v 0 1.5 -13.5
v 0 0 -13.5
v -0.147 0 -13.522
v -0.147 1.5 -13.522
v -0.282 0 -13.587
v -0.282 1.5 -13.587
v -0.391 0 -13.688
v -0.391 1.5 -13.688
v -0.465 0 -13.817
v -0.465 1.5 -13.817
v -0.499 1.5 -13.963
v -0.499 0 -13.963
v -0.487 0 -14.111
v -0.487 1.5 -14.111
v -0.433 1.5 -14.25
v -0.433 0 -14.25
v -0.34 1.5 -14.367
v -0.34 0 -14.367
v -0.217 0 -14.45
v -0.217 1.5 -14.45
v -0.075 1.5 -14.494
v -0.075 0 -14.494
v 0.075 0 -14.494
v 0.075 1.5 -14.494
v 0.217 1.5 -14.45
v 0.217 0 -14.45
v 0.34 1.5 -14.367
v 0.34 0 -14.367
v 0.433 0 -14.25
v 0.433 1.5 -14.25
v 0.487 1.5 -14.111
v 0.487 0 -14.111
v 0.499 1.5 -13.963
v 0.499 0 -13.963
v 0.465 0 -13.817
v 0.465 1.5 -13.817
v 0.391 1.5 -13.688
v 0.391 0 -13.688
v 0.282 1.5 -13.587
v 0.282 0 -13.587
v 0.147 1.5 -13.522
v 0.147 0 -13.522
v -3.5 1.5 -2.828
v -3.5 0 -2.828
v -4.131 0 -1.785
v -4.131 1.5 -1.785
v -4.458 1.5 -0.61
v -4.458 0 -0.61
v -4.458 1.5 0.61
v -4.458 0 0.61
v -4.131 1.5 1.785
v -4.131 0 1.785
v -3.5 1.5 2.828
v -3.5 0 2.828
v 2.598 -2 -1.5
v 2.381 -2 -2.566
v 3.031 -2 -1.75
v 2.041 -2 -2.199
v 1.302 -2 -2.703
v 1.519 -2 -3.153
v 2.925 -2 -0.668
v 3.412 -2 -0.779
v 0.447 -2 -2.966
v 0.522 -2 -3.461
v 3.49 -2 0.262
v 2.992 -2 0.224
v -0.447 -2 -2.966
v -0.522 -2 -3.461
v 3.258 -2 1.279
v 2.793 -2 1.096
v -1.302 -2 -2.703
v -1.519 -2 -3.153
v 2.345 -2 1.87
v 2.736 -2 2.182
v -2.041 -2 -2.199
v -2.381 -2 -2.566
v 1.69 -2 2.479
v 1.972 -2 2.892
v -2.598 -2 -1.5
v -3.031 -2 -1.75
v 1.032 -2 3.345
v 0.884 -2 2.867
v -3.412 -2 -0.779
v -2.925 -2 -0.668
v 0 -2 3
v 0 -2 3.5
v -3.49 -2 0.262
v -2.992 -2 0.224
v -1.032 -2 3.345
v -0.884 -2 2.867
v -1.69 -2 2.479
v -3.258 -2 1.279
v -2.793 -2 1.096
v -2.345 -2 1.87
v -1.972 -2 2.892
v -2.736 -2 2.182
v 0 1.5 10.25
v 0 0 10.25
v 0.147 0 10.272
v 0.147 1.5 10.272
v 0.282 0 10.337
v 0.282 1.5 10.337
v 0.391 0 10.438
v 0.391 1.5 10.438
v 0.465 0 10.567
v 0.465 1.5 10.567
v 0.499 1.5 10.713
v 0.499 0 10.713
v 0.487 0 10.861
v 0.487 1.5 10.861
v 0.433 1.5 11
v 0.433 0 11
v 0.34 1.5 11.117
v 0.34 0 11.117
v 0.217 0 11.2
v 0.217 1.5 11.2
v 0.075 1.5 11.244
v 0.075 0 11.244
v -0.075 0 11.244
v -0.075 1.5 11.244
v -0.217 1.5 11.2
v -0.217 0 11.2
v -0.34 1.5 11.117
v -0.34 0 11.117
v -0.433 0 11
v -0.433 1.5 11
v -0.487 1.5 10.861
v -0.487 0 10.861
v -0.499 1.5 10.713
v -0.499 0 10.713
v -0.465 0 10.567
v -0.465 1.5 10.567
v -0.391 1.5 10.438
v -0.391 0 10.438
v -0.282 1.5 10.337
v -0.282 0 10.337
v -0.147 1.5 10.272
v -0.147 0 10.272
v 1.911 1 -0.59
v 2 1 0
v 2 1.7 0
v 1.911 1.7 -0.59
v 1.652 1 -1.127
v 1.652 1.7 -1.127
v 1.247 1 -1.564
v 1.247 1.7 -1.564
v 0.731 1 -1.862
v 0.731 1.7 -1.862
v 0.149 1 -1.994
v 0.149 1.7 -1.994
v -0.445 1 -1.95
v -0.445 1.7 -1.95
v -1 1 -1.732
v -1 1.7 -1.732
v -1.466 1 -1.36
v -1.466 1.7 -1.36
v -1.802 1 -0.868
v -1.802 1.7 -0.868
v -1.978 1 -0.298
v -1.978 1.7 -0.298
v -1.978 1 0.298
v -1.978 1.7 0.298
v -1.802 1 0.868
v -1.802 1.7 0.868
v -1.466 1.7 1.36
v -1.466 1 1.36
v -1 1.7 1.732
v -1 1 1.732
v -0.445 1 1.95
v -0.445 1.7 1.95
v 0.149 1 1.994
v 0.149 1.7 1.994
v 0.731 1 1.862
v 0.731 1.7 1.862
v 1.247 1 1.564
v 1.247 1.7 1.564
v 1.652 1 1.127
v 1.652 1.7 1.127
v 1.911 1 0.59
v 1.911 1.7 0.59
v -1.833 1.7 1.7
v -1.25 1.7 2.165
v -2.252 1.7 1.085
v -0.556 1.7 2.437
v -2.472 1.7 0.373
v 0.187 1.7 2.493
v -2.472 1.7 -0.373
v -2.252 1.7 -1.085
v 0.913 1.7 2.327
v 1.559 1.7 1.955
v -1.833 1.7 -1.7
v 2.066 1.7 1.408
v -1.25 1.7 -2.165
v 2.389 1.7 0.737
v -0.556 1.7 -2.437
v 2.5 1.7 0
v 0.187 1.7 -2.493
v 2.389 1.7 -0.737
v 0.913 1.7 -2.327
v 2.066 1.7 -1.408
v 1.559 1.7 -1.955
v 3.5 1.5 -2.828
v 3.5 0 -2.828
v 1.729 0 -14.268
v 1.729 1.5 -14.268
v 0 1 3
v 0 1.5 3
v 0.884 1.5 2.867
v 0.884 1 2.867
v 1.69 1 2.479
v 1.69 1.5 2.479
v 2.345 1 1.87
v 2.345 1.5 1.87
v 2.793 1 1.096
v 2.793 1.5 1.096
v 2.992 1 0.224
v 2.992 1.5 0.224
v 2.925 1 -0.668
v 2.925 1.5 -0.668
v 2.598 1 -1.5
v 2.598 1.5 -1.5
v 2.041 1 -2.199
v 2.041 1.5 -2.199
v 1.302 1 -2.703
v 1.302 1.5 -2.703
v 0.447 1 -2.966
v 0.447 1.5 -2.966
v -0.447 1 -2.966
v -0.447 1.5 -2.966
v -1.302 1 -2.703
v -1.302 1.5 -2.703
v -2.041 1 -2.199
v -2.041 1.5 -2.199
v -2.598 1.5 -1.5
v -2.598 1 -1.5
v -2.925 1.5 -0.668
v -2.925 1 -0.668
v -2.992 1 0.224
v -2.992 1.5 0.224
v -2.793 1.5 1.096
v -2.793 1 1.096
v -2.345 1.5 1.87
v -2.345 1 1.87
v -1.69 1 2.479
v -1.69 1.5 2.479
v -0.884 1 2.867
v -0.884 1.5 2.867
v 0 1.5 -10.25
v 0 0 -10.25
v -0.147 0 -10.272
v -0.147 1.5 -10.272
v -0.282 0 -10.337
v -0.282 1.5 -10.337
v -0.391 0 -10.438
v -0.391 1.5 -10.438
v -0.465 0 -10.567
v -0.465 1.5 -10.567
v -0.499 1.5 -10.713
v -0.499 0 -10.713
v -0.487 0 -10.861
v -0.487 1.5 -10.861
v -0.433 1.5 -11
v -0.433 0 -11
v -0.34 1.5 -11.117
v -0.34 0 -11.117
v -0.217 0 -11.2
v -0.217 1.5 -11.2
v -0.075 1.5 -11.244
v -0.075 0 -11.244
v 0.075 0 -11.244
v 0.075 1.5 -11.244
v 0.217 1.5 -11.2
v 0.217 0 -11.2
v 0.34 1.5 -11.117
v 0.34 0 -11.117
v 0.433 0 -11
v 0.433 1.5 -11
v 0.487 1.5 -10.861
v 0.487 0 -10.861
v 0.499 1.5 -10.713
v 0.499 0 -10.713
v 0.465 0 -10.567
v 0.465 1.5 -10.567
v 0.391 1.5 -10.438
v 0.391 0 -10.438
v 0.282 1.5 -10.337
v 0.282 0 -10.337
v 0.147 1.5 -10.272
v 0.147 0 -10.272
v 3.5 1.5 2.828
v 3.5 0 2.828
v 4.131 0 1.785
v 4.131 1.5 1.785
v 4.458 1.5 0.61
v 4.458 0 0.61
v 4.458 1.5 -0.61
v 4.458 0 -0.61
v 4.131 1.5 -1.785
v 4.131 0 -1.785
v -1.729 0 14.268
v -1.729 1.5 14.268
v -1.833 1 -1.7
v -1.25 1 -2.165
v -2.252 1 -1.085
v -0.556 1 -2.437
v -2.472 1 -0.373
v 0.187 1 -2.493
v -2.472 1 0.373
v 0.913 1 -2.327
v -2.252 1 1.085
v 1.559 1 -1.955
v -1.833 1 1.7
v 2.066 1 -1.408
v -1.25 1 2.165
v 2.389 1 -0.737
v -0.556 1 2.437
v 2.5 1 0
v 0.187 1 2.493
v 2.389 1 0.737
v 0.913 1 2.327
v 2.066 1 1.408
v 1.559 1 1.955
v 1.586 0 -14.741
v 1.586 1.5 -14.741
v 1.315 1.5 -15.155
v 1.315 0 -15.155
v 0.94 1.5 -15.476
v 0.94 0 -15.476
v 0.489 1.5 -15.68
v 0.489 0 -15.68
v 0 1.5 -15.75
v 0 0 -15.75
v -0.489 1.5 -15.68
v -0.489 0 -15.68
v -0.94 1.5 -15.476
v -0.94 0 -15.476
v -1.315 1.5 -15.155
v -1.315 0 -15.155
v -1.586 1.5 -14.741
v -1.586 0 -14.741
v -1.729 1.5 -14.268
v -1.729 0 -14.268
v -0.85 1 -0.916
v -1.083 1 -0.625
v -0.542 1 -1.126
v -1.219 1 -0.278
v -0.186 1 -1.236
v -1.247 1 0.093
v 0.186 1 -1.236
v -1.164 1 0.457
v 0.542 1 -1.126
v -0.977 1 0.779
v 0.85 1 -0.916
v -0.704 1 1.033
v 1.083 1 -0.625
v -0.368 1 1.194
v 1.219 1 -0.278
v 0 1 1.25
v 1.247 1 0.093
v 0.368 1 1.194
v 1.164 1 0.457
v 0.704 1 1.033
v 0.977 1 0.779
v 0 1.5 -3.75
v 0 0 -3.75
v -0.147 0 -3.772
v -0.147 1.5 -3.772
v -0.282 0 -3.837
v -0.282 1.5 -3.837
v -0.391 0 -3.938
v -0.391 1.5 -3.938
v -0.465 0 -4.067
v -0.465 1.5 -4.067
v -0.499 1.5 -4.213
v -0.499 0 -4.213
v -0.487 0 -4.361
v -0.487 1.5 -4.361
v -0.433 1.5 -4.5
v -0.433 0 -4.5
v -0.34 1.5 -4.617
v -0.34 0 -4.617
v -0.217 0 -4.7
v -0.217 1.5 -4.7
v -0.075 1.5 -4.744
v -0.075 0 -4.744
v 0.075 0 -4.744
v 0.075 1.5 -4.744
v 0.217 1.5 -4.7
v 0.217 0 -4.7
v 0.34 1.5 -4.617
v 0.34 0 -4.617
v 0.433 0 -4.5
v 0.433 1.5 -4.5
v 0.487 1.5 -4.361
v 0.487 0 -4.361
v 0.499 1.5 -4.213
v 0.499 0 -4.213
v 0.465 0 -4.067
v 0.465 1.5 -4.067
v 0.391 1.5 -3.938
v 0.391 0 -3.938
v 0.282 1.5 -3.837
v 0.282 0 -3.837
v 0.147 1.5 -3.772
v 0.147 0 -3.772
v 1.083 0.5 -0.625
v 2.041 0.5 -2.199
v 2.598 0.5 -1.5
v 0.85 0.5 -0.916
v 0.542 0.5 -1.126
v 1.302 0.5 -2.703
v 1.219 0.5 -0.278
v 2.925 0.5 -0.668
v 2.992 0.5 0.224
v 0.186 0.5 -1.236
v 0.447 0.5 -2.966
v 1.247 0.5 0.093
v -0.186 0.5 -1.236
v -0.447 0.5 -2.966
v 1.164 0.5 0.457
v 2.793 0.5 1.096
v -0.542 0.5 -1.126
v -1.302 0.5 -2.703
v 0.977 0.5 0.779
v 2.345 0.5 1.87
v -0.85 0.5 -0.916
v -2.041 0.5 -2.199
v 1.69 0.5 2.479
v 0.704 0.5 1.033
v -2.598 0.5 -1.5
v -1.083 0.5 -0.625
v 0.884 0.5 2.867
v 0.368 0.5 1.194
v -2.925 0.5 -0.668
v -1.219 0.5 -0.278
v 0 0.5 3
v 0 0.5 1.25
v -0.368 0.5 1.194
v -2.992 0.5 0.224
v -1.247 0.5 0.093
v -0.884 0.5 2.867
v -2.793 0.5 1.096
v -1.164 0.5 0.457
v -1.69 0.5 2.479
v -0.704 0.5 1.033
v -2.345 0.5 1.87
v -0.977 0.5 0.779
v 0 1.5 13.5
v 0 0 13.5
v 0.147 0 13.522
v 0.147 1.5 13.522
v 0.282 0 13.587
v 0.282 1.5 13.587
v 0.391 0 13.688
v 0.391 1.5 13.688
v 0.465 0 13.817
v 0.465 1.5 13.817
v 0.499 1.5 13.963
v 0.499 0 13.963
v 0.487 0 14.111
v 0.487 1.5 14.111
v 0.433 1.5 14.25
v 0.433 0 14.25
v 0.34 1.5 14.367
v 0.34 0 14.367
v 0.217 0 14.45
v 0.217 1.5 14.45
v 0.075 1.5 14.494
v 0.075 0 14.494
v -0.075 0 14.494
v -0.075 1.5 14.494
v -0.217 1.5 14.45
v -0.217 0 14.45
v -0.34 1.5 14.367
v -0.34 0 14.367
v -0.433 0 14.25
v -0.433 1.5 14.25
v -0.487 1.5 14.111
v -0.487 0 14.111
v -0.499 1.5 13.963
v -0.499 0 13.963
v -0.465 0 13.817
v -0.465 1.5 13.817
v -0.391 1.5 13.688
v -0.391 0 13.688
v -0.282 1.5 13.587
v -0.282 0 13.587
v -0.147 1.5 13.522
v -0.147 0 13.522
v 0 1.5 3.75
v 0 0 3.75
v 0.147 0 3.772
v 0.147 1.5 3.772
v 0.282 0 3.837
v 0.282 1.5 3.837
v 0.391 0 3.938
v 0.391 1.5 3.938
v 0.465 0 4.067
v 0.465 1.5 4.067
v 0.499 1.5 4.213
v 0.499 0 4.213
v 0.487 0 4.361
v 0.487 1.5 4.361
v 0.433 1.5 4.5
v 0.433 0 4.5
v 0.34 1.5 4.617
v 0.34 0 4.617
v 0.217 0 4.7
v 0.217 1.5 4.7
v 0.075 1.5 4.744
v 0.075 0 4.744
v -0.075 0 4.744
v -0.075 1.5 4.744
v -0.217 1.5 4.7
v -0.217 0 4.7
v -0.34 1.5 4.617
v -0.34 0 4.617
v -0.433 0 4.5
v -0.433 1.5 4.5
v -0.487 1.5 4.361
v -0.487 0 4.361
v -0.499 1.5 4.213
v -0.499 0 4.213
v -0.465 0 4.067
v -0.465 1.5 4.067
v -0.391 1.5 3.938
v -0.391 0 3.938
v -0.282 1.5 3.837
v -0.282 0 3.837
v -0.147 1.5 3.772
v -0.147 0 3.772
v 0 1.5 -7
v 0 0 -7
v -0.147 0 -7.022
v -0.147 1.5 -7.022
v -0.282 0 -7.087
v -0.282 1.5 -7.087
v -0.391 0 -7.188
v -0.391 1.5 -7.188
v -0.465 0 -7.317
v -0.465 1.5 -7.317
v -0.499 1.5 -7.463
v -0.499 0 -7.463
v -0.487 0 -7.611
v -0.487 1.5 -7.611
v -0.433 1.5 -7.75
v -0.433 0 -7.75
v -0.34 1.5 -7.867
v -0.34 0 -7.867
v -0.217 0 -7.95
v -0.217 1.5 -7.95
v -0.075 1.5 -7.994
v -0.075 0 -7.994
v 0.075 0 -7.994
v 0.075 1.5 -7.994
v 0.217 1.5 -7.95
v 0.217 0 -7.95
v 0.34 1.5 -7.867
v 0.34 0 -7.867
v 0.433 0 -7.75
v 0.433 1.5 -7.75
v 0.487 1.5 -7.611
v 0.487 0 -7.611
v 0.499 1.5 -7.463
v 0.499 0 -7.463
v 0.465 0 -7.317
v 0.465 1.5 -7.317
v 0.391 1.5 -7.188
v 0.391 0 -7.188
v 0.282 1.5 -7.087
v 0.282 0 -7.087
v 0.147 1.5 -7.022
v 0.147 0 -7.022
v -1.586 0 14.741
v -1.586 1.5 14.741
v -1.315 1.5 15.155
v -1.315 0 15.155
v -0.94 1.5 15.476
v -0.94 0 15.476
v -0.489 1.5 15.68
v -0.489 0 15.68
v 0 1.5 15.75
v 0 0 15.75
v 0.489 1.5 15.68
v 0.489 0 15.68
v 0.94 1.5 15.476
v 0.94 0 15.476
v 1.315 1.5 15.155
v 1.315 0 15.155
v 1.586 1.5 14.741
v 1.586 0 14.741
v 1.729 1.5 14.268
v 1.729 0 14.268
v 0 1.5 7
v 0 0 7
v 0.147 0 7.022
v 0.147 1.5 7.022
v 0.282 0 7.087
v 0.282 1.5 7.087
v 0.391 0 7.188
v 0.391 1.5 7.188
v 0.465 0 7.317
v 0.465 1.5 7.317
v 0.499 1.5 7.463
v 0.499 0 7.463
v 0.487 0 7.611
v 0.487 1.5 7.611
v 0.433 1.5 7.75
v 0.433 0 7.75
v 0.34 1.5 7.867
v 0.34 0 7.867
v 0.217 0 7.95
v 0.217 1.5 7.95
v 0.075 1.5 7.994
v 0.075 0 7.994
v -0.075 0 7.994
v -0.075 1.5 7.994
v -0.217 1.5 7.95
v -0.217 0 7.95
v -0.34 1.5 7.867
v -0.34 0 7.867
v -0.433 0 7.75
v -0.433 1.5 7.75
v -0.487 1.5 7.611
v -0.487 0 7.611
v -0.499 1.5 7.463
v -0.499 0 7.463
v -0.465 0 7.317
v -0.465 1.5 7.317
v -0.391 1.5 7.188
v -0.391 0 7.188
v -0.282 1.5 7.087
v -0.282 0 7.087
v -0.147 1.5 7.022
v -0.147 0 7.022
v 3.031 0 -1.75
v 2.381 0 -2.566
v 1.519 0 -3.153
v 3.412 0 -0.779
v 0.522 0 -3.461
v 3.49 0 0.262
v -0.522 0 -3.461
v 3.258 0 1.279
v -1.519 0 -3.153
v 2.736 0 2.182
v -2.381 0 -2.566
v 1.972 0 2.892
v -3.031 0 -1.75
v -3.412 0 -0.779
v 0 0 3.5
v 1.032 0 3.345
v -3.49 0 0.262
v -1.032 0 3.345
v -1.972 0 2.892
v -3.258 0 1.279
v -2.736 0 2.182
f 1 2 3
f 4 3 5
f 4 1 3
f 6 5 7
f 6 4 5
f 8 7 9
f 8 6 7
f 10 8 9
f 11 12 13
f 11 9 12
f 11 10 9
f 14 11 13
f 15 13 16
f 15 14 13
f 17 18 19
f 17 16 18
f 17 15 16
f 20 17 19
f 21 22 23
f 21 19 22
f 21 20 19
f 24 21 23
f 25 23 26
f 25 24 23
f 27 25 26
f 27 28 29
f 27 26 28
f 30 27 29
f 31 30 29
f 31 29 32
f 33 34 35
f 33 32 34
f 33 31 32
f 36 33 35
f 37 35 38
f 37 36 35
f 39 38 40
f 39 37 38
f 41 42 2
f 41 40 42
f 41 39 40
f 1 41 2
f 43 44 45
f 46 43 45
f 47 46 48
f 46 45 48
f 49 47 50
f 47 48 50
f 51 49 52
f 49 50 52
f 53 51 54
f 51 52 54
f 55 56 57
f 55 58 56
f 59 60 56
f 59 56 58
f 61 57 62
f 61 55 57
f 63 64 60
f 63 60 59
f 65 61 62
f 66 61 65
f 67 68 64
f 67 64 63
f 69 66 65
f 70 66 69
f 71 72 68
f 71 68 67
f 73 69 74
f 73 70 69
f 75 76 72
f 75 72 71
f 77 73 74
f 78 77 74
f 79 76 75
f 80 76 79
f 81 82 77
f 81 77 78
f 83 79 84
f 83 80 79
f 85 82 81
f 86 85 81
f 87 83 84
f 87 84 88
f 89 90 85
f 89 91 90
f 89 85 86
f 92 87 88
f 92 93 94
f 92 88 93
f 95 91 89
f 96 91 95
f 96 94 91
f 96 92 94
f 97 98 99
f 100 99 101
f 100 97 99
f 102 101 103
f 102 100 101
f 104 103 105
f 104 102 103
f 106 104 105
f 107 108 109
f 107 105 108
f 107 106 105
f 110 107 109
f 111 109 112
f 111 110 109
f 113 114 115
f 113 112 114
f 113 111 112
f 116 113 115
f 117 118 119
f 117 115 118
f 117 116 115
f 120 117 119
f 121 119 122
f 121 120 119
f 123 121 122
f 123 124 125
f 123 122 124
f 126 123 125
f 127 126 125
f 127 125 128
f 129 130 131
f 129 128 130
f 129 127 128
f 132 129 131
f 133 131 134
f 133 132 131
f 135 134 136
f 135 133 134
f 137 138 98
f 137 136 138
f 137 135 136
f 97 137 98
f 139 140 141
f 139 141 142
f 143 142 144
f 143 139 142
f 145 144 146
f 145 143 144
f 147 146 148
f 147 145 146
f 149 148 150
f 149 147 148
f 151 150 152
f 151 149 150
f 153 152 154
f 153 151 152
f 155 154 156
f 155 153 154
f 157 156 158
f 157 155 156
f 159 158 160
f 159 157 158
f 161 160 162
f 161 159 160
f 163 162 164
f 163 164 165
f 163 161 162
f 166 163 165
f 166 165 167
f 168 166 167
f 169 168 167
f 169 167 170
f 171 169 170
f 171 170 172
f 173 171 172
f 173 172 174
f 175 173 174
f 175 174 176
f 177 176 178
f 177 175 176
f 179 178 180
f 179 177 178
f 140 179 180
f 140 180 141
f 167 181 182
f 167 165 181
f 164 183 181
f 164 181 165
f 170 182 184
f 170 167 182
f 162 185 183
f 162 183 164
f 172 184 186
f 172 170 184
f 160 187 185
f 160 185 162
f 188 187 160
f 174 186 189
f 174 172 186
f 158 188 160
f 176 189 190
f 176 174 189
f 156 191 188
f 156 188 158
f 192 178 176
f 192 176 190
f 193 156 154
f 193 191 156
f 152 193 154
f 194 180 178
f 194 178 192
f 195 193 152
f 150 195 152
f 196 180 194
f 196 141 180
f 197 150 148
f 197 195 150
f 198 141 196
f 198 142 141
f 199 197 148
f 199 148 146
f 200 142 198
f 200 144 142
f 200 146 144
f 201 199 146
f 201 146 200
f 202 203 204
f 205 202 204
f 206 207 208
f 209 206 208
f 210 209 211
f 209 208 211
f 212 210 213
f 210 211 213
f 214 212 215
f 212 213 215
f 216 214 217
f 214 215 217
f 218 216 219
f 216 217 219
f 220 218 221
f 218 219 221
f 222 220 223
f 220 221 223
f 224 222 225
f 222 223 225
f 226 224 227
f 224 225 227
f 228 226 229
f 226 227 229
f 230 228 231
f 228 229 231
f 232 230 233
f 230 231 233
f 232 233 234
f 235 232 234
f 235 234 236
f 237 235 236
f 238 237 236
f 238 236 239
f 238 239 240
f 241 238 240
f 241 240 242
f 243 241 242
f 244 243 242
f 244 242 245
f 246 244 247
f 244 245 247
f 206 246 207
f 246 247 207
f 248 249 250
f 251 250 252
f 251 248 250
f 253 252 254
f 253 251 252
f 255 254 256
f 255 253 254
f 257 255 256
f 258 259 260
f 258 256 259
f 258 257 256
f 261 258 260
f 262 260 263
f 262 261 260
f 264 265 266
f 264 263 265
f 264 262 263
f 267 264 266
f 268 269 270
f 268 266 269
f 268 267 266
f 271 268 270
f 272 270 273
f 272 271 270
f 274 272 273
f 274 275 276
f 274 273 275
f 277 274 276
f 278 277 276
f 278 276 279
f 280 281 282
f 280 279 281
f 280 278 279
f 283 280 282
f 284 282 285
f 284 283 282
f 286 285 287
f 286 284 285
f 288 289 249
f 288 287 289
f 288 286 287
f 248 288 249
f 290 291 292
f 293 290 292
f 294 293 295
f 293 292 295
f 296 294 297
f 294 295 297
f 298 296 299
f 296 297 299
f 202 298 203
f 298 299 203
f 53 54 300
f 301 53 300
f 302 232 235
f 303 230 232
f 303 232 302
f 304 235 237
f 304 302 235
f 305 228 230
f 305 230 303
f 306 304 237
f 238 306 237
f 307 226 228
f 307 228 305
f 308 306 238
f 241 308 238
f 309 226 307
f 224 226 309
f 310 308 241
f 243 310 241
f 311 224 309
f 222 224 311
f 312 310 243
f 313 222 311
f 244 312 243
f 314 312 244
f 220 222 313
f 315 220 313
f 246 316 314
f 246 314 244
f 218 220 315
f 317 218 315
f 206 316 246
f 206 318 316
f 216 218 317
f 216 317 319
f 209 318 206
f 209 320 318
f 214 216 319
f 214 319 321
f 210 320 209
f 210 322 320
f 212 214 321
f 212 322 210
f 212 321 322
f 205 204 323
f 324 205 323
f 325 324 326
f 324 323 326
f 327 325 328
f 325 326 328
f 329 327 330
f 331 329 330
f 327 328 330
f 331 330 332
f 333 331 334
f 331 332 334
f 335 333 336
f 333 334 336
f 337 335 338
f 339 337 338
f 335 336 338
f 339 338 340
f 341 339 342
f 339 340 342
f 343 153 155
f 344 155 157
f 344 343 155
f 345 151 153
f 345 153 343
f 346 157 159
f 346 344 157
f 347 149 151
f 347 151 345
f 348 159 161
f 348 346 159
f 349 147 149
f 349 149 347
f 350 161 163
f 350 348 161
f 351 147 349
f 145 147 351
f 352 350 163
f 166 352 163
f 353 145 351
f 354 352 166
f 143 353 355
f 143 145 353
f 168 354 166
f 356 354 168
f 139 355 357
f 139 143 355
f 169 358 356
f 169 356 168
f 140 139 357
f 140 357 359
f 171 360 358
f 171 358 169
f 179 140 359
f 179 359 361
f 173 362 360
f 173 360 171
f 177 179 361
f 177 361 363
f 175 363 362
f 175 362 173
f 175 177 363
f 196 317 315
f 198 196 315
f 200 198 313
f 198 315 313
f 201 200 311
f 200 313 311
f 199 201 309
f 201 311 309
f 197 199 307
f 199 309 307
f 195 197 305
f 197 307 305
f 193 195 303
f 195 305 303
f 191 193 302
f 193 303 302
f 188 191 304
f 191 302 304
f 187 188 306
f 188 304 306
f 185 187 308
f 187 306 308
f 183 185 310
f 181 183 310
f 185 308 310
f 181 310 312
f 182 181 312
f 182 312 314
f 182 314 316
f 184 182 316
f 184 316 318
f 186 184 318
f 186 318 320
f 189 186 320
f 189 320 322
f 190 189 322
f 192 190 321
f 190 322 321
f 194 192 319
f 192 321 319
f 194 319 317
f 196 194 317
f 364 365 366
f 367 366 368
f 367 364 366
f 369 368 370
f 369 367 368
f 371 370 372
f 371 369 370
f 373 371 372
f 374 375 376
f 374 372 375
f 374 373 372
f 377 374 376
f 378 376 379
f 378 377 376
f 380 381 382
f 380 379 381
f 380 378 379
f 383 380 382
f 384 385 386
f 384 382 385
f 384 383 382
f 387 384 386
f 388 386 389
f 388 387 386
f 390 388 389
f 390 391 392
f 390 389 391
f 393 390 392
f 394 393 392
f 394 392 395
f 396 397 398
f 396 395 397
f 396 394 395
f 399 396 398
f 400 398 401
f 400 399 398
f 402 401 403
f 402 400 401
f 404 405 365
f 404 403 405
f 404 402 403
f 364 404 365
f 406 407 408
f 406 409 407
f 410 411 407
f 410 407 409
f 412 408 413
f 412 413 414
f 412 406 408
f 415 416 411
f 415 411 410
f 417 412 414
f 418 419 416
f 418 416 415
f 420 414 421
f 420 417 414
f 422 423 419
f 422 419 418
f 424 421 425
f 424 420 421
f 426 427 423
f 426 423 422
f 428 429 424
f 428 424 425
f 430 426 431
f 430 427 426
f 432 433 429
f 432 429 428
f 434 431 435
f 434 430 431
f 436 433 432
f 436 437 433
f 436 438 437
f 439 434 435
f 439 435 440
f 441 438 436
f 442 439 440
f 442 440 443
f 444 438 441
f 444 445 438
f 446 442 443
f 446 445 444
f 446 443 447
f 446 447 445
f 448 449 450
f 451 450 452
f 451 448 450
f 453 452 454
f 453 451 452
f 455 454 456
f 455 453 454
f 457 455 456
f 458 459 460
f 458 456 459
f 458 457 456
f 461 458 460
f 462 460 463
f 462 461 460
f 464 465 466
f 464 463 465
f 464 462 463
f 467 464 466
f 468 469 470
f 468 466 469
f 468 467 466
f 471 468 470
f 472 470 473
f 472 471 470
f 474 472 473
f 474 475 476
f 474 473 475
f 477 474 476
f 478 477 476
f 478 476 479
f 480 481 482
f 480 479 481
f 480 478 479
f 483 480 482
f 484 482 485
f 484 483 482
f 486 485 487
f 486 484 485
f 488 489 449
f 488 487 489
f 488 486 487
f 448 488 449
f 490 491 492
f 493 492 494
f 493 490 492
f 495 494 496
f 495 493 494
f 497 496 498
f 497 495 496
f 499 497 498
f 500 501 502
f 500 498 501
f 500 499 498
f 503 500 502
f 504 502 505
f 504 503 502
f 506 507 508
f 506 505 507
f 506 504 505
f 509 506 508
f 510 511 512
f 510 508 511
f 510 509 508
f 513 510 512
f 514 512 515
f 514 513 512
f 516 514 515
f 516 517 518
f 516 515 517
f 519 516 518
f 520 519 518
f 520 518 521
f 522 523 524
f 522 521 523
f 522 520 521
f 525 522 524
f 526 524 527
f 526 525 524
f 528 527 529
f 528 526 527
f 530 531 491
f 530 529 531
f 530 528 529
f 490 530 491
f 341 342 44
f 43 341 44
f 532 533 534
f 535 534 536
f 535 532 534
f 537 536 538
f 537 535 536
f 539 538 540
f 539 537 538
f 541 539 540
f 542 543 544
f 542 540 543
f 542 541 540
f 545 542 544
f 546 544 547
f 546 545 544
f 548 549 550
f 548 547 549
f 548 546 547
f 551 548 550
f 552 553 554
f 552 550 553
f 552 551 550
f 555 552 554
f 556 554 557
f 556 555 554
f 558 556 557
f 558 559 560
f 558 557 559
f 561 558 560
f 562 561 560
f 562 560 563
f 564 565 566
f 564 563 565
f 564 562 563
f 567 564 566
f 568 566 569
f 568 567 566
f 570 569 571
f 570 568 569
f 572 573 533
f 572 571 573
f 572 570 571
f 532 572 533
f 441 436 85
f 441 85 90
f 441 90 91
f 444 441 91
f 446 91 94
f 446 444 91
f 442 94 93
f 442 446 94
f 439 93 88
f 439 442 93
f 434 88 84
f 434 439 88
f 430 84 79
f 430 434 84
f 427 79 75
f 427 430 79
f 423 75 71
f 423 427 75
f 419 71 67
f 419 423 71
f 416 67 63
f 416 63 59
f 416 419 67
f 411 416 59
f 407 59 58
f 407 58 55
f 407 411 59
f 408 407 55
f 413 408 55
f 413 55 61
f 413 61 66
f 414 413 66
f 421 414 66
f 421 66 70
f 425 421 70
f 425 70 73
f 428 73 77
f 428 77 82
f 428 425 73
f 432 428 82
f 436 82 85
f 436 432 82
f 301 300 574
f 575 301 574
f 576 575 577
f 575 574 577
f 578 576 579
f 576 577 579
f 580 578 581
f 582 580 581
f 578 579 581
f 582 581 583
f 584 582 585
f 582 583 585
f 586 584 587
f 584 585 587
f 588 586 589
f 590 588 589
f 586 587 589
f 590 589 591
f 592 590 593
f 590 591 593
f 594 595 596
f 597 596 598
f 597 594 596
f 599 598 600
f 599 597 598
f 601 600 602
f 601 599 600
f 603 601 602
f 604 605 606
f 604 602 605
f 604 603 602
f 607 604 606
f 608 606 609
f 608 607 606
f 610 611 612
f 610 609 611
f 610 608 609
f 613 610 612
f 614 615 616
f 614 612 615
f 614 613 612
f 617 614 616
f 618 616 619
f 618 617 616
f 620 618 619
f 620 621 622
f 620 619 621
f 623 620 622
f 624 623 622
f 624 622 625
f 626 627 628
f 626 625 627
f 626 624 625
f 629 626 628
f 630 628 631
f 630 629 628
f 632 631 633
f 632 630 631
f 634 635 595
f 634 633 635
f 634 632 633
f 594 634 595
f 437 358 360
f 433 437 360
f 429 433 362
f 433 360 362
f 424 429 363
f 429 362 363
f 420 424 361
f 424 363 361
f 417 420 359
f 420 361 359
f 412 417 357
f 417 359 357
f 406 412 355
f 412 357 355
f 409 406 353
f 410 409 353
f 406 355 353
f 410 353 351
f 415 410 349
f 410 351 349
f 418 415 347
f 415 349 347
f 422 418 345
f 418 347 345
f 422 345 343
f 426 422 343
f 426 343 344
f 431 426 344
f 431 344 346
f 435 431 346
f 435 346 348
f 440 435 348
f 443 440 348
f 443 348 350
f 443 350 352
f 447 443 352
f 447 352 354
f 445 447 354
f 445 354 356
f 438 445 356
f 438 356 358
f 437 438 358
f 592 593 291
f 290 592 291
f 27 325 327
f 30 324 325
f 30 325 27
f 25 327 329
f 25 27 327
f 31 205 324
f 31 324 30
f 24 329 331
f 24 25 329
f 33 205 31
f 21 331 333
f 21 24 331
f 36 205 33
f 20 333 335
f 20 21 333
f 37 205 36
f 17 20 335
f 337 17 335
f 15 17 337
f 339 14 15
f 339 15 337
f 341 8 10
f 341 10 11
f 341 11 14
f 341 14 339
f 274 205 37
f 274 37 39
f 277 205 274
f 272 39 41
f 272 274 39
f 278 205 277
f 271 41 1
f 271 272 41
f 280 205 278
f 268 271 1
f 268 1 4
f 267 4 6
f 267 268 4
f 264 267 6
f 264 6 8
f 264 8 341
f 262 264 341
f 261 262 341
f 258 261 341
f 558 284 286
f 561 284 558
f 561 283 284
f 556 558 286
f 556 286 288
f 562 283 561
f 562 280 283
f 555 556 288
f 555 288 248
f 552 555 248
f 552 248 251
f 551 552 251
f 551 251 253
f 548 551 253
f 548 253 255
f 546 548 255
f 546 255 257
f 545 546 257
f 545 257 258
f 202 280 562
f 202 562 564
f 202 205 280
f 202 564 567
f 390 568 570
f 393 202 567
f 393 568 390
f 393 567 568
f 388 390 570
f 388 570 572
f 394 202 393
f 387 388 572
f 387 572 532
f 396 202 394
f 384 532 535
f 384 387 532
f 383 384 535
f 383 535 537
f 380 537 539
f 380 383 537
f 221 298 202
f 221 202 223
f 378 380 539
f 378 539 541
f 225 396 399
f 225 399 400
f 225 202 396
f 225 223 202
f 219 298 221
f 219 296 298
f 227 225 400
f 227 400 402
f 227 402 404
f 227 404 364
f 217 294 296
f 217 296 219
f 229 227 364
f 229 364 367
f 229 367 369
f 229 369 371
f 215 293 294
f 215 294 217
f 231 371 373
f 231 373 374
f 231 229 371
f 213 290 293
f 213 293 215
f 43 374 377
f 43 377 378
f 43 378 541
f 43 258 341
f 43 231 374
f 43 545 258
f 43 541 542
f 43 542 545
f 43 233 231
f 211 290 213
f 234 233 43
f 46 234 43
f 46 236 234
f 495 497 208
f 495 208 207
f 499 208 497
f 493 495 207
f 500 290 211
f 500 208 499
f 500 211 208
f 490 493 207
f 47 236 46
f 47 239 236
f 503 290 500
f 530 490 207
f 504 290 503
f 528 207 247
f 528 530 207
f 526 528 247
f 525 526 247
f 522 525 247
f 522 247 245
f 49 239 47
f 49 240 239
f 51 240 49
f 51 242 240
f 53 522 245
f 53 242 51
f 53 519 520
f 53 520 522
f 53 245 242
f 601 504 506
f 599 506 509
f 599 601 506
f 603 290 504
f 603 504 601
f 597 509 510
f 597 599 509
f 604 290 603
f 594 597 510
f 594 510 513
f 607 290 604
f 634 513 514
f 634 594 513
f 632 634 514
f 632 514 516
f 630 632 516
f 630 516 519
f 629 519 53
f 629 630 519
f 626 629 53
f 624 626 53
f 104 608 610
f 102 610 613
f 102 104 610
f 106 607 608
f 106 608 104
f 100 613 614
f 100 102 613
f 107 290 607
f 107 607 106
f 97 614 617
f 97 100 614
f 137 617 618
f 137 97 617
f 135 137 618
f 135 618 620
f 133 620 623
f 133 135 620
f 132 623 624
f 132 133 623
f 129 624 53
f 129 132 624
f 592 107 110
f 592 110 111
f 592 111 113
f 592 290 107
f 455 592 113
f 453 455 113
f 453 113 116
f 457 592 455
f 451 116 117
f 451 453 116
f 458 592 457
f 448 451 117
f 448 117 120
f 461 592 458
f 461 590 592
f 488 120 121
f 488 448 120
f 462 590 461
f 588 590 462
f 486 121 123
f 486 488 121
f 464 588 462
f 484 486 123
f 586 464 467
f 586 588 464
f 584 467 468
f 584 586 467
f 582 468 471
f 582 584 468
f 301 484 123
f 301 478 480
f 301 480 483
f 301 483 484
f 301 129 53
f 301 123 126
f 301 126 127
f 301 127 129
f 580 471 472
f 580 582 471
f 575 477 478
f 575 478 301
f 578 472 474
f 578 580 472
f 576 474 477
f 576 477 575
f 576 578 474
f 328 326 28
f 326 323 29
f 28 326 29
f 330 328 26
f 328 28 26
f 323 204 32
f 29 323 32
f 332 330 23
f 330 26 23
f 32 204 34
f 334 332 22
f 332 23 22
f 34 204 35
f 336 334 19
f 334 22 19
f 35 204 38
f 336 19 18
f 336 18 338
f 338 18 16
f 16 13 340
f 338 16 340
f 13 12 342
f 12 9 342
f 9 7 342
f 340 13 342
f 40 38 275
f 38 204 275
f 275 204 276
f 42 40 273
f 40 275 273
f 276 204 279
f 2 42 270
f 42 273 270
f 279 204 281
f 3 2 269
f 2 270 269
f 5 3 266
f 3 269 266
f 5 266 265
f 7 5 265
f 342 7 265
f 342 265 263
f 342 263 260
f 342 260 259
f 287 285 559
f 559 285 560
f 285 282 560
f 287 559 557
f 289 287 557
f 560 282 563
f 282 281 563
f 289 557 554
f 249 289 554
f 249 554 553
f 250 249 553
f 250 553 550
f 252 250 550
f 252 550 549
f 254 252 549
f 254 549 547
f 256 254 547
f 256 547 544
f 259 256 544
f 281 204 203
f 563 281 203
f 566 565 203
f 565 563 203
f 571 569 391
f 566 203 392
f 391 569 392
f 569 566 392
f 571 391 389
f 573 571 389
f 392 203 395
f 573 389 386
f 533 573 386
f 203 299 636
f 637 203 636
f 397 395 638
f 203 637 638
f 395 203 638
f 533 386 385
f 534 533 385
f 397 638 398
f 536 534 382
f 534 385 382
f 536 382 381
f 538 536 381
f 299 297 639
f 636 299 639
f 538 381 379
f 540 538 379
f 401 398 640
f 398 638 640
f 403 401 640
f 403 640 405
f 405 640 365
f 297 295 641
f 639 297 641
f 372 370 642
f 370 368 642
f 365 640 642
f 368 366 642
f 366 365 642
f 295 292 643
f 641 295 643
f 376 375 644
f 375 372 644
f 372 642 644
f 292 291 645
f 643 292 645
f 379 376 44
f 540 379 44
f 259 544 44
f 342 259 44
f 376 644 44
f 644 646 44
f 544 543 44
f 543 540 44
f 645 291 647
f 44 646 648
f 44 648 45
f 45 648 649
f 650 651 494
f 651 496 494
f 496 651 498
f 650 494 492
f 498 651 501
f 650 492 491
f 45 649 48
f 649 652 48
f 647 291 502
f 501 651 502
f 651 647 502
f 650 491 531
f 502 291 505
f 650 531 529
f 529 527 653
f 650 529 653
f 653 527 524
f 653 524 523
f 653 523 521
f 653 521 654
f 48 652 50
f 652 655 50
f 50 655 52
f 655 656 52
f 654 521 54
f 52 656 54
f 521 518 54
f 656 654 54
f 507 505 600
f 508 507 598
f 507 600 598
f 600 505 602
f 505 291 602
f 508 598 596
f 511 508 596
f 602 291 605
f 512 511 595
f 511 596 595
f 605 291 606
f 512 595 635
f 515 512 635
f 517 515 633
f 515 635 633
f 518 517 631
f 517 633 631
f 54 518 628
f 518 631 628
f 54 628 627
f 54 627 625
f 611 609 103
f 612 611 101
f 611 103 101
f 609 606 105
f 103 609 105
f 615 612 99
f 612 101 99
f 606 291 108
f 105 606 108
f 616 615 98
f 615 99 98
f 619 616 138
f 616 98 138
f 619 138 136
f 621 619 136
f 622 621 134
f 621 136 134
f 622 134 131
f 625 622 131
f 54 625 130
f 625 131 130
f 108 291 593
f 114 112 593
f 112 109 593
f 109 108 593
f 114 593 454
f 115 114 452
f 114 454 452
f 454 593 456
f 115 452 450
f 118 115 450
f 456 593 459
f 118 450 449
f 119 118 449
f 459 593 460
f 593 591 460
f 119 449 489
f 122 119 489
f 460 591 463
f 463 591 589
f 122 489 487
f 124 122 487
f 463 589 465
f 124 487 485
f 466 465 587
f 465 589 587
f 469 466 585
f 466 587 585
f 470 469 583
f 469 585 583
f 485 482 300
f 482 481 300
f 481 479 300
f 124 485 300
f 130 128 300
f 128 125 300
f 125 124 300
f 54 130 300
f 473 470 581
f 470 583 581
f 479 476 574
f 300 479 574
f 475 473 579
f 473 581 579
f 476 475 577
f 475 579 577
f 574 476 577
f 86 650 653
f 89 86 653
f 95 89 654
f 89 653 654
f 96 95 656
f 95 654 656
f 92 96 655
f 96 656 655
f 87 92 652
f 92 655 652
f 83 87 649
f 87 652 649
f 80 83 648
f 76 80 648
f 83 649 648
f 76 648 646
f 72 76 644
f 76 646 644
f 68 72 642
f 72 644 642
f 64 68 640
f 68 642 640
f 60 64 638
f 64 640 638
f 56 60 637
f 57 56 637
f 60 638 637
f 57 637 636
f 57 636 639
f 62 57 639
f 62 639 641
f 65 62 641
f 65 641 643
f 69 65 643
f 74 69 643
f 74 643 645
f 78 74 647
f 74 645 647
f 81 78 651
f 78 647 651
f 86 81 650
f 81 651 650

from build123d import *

# Parameters (mm, degrees)
SKETCH1_R                         = 4.5
BOSS_EXTRUDE1_DEPTH               = 1.5
BOSS_EXTRUDE2_DEPTH               = 1.5
F_1_0_1_DIAMETER_HOLE1_AT_2_COUNT = 2
F_1_0_1_DIAMETER_HOLE1_AT_2_PITCH = 3.25
F_1_0_1_DIAMETER_HOLE1_AT_3_COUNT = 2
F_1_0_1_DIAMETER_HOLE1_AT_3_PITCH = 6.5
F_1_0_1_DIAMETER_HOLE1_AT_4_COUNT = 2
F_1_0_1_DIAMETER_HOLE1_AT_4_PITCH = 9.75
CIRPATTERN1_COUNT                 = 2
SKETCH6_R                         = 3
CUT_EXTRUDE1_DEPTH                = 0.5
SKETCH7_R                         = 2.5
SKETCH7_R_2                       = 2
EXTRUDE_THIN1_DEPTH               = 0.7
SKETCH8_R                         = 1.25
CUT_EXTRUDE2_DEPTH                = 17.410743432
SKETCH9_R                         = 3.5
BOSS_EXTRUDE3_DEPTH               = 2
CUT_EXTRUDE3_START                = -2.5
SKETCH10_R                        = 3
CUT_EXTRUDE3_DEPTH                = 2.5


with BuildPart() as part:
    # Sketch1 → Boss-Extrude1 (new body)
    with BuildSketch(Plane(origin=(0, 0, 0), x_dir=(1, 0, 0), z_dir=(0, 1, 0))):
        with Locations(Location((0, 0, 0), (0, 0, 270))):
            Circle(SKETCH1_R)
    extrude(amount=BOSS_EXTRUDE1_DEPTH)

    # Sketch2 → Boss-Extrude2 (add)
    with BuildSketch(Plane(origin=(0, 0, 0), x_dir=(1, 0, 0), z_dir=(0, 1, 0))):
        with BuildLine():
            Line((3.5, 2.828427125), (1.729406446, 14.267681426))
            ThreePointArc((1.729406446, 14.267681426), (0, 15.75), (-1.729406446, 14.267681426))
            Line((-1.729406446, 14.267681426), (-3.5, 2.828427125))
            Line((-3.5, 2.828427125), (3.5, 2.828427125))
        make_face()
    boss_extrude2 = extrude(amount=BOSS_EXTRUDE2_DEPTH)

    # Sketch5 → Ø1.0 (1) Diameter Hole1 (revolve, cut)
    with BuildSketch(Plane(origin=(0, 1.5, -14), x_dir=(0, 0, 1), z_dir=(1, 0, 0))):
        Polygon((0, 0), (0, 7.80043031), (0.5, 7.5), (0.5, 0), align=None)
    f_1_0_1_diameter_hole1 = revolve(axis=Axis((0, 7.85, -14), (0, -1, 0)), mode=Mode.SUBTRACT)

    # Ø1.0 (1) Diameter Hole1 at 2: Ø1.0 (1) Diameter Hole1 ×2
    with Locations(*[(0, 0, i * F_1_0_1_DIAMETER_HOLE1_AT_2_PITCH) for i in range(1, F_1_0_1_DIAMETER_HOLE1_AT_2_COUNT)]):
        add(f_1_0_1_diameter_hole1, mode=Mode.SUBTRACT)

    # Ø1.0 (1) Diameter Hole1 at 3: Ø1.0 (1) Diameter Hole1 ×2
    with Locations(*[(0, 0, i * F_1_0_1_DIAMETER_HOLE1_AT_3_PITCH) for i in range(1, F_1_0_1_DIAMETER_HOLE1_AT_3_COUNT)]):
        add(f_1_0_1_diameter_hole1, mode=Mode.SUBTRACT)

    # Ø1.0 (1) Diameter Hole1 at 4: Ø1.0 (1) Diameter Hole1 ×2
    with Locations(*[(0, 0, i * F_1_0_1_DIAMETER_HOLE1_AT_4_PITCH) for i in range(1, F_1_0_1_DIAMETER_HOLE1_AT_4_COUNT)]):
        add(f_1_0_1_diameter_hole1, mode=Mode.SUBTRACT)

    # CirPattern1: Boss-Extrude2, Ø1.0 (1) Diameter Hole1 ×2 about axis
    cirpattern1_axis = Axis((0, 0, 0), (0, 1, 0))
    add([boss_extrude2.rotate(cirpattern1_axis, i * 360 / CIRPATTERN1_COUNT) for i in range(1, CIRPATTERN1_COUNT)])
    add([f_1_0_1_diameter_hole1.rotate(cirpattern1_axis, i * 360 / CIRPATTERN1_COUNT) for i in range(1, CIRPATTERN1_COUNT)], mode=Mode.SUBTRACT)

    # CirPattern1 copy 1 sketch → CirPattern1 copy 1 (revolve, cut)
    with BuildSketch(Plane(origin=(0, 1.5, 10.75), x_dir=(0, 0, -1), z_dir=(-1, 0, 0))):
        Polygon((0, 0), (0, 7.80043031), (0.5, 7.5), (0.5, 0), align=None)
    revolve(axis=Axis((0, 7.85, 10.75), (0, -1, 0)), mode=Mode.SUBTRACT)

    # CirPattern1 copy 2 sketch → CirPattern1 copy 2 (revolve, cut)
    with BuildSketch(Plane(origin=(0, 1.5, 7.5), x_dir=(0, 0, -1), z_dir=(-1, 0, 0))):
        Polygon((0, 0), (0, 7.80043031), (0.5, 7.5), (0.5, 0), align=None)
    revolve(axis=Axis((0, 7.85, 7.5), (0, -1, 0)), mode=Mode.SUBTRACT)

    # CirPattern1 copy 3 sketch → CirPattern1 copy 3 (revolve, cut)
    with BuildSketch(Plane(origin=(0, 1.5, 4.25), x_dir=(0, 0, -1), z_dir=(-1, 0, 0))):
        Polygon((0, 0), (0, 7.80043031), (0.5, 7.5), (0.5, 0), align=None)
    revolve(axis=Axis((0, 7.85, 4.25), (0, -1, 0)), mode=Mode.SUBTRACT)

    # Sketch6 → Cut-Extrude1 (cut)
    with BuildSketch(Plane(origin=(0, 1.5, 0), x_dir=(1, 0, 0), z_dir=(0, 1, 0))):
        with Locations(Location((0, 0, 0), (0, 0, 270))):
            Circle(SKETCH6_R)
    extrude(amount=-CUT_EXTRUDE1_DEPTH, mode=Mode.SUBTRACT)

    # Sketch7 → Extrude-Thin1 (add)
    with BuildSketch(Plane(origin=(0, 1, 0), x_dir=(1, 0, 0), z_dir=(0, 1, 0))):
        Circle(SKETCH7_R)
        Circle(SKETCH7_R_2, mode=Mode.SUBTRACT)
    extrude(amount=EXTRUDE_THIN1_DEPTH)

    # Sketch8 → Cut-Extrude2 (cut, through all)
    with BuildSketch(Plane(origin=(0, 1, 0), x_dir=(1, 0, 0), z_dir=(0, 1, 0))):
        with Locations(Location((0, 0, 0), (0, 0, 270))):
            Circle(SKETCH8_R)
    extrude(amount=-CUT_EXTRUDE2_DEPTH, mode=Mode.SUBTRACT)

    # Sketch9 → Boss-Extrude3 (add)
    with BuildSketch(Plane.XZ):
        with Locations(Location((0, 0, 0), (0, 0, 90))):
            Circle(SKETCH9_R)
    extrude(amount=BOSS_EXTRUDE3_DEPTH)

    # Sketch10 → Cut-Extrude3 (cut)
    with BuildSketch(Plane.XZ.offset(2).offset(CUT_EXTRUDE3_START)):
        with Locations(Location((0, 0, 0), (0, 0, 90))):
            Circle(SKETCH10_R)
    extrude(amount=CUT_EXTRUDE3_DEPTH, mode=Mode.SUBTRACT)


solid = part.part
